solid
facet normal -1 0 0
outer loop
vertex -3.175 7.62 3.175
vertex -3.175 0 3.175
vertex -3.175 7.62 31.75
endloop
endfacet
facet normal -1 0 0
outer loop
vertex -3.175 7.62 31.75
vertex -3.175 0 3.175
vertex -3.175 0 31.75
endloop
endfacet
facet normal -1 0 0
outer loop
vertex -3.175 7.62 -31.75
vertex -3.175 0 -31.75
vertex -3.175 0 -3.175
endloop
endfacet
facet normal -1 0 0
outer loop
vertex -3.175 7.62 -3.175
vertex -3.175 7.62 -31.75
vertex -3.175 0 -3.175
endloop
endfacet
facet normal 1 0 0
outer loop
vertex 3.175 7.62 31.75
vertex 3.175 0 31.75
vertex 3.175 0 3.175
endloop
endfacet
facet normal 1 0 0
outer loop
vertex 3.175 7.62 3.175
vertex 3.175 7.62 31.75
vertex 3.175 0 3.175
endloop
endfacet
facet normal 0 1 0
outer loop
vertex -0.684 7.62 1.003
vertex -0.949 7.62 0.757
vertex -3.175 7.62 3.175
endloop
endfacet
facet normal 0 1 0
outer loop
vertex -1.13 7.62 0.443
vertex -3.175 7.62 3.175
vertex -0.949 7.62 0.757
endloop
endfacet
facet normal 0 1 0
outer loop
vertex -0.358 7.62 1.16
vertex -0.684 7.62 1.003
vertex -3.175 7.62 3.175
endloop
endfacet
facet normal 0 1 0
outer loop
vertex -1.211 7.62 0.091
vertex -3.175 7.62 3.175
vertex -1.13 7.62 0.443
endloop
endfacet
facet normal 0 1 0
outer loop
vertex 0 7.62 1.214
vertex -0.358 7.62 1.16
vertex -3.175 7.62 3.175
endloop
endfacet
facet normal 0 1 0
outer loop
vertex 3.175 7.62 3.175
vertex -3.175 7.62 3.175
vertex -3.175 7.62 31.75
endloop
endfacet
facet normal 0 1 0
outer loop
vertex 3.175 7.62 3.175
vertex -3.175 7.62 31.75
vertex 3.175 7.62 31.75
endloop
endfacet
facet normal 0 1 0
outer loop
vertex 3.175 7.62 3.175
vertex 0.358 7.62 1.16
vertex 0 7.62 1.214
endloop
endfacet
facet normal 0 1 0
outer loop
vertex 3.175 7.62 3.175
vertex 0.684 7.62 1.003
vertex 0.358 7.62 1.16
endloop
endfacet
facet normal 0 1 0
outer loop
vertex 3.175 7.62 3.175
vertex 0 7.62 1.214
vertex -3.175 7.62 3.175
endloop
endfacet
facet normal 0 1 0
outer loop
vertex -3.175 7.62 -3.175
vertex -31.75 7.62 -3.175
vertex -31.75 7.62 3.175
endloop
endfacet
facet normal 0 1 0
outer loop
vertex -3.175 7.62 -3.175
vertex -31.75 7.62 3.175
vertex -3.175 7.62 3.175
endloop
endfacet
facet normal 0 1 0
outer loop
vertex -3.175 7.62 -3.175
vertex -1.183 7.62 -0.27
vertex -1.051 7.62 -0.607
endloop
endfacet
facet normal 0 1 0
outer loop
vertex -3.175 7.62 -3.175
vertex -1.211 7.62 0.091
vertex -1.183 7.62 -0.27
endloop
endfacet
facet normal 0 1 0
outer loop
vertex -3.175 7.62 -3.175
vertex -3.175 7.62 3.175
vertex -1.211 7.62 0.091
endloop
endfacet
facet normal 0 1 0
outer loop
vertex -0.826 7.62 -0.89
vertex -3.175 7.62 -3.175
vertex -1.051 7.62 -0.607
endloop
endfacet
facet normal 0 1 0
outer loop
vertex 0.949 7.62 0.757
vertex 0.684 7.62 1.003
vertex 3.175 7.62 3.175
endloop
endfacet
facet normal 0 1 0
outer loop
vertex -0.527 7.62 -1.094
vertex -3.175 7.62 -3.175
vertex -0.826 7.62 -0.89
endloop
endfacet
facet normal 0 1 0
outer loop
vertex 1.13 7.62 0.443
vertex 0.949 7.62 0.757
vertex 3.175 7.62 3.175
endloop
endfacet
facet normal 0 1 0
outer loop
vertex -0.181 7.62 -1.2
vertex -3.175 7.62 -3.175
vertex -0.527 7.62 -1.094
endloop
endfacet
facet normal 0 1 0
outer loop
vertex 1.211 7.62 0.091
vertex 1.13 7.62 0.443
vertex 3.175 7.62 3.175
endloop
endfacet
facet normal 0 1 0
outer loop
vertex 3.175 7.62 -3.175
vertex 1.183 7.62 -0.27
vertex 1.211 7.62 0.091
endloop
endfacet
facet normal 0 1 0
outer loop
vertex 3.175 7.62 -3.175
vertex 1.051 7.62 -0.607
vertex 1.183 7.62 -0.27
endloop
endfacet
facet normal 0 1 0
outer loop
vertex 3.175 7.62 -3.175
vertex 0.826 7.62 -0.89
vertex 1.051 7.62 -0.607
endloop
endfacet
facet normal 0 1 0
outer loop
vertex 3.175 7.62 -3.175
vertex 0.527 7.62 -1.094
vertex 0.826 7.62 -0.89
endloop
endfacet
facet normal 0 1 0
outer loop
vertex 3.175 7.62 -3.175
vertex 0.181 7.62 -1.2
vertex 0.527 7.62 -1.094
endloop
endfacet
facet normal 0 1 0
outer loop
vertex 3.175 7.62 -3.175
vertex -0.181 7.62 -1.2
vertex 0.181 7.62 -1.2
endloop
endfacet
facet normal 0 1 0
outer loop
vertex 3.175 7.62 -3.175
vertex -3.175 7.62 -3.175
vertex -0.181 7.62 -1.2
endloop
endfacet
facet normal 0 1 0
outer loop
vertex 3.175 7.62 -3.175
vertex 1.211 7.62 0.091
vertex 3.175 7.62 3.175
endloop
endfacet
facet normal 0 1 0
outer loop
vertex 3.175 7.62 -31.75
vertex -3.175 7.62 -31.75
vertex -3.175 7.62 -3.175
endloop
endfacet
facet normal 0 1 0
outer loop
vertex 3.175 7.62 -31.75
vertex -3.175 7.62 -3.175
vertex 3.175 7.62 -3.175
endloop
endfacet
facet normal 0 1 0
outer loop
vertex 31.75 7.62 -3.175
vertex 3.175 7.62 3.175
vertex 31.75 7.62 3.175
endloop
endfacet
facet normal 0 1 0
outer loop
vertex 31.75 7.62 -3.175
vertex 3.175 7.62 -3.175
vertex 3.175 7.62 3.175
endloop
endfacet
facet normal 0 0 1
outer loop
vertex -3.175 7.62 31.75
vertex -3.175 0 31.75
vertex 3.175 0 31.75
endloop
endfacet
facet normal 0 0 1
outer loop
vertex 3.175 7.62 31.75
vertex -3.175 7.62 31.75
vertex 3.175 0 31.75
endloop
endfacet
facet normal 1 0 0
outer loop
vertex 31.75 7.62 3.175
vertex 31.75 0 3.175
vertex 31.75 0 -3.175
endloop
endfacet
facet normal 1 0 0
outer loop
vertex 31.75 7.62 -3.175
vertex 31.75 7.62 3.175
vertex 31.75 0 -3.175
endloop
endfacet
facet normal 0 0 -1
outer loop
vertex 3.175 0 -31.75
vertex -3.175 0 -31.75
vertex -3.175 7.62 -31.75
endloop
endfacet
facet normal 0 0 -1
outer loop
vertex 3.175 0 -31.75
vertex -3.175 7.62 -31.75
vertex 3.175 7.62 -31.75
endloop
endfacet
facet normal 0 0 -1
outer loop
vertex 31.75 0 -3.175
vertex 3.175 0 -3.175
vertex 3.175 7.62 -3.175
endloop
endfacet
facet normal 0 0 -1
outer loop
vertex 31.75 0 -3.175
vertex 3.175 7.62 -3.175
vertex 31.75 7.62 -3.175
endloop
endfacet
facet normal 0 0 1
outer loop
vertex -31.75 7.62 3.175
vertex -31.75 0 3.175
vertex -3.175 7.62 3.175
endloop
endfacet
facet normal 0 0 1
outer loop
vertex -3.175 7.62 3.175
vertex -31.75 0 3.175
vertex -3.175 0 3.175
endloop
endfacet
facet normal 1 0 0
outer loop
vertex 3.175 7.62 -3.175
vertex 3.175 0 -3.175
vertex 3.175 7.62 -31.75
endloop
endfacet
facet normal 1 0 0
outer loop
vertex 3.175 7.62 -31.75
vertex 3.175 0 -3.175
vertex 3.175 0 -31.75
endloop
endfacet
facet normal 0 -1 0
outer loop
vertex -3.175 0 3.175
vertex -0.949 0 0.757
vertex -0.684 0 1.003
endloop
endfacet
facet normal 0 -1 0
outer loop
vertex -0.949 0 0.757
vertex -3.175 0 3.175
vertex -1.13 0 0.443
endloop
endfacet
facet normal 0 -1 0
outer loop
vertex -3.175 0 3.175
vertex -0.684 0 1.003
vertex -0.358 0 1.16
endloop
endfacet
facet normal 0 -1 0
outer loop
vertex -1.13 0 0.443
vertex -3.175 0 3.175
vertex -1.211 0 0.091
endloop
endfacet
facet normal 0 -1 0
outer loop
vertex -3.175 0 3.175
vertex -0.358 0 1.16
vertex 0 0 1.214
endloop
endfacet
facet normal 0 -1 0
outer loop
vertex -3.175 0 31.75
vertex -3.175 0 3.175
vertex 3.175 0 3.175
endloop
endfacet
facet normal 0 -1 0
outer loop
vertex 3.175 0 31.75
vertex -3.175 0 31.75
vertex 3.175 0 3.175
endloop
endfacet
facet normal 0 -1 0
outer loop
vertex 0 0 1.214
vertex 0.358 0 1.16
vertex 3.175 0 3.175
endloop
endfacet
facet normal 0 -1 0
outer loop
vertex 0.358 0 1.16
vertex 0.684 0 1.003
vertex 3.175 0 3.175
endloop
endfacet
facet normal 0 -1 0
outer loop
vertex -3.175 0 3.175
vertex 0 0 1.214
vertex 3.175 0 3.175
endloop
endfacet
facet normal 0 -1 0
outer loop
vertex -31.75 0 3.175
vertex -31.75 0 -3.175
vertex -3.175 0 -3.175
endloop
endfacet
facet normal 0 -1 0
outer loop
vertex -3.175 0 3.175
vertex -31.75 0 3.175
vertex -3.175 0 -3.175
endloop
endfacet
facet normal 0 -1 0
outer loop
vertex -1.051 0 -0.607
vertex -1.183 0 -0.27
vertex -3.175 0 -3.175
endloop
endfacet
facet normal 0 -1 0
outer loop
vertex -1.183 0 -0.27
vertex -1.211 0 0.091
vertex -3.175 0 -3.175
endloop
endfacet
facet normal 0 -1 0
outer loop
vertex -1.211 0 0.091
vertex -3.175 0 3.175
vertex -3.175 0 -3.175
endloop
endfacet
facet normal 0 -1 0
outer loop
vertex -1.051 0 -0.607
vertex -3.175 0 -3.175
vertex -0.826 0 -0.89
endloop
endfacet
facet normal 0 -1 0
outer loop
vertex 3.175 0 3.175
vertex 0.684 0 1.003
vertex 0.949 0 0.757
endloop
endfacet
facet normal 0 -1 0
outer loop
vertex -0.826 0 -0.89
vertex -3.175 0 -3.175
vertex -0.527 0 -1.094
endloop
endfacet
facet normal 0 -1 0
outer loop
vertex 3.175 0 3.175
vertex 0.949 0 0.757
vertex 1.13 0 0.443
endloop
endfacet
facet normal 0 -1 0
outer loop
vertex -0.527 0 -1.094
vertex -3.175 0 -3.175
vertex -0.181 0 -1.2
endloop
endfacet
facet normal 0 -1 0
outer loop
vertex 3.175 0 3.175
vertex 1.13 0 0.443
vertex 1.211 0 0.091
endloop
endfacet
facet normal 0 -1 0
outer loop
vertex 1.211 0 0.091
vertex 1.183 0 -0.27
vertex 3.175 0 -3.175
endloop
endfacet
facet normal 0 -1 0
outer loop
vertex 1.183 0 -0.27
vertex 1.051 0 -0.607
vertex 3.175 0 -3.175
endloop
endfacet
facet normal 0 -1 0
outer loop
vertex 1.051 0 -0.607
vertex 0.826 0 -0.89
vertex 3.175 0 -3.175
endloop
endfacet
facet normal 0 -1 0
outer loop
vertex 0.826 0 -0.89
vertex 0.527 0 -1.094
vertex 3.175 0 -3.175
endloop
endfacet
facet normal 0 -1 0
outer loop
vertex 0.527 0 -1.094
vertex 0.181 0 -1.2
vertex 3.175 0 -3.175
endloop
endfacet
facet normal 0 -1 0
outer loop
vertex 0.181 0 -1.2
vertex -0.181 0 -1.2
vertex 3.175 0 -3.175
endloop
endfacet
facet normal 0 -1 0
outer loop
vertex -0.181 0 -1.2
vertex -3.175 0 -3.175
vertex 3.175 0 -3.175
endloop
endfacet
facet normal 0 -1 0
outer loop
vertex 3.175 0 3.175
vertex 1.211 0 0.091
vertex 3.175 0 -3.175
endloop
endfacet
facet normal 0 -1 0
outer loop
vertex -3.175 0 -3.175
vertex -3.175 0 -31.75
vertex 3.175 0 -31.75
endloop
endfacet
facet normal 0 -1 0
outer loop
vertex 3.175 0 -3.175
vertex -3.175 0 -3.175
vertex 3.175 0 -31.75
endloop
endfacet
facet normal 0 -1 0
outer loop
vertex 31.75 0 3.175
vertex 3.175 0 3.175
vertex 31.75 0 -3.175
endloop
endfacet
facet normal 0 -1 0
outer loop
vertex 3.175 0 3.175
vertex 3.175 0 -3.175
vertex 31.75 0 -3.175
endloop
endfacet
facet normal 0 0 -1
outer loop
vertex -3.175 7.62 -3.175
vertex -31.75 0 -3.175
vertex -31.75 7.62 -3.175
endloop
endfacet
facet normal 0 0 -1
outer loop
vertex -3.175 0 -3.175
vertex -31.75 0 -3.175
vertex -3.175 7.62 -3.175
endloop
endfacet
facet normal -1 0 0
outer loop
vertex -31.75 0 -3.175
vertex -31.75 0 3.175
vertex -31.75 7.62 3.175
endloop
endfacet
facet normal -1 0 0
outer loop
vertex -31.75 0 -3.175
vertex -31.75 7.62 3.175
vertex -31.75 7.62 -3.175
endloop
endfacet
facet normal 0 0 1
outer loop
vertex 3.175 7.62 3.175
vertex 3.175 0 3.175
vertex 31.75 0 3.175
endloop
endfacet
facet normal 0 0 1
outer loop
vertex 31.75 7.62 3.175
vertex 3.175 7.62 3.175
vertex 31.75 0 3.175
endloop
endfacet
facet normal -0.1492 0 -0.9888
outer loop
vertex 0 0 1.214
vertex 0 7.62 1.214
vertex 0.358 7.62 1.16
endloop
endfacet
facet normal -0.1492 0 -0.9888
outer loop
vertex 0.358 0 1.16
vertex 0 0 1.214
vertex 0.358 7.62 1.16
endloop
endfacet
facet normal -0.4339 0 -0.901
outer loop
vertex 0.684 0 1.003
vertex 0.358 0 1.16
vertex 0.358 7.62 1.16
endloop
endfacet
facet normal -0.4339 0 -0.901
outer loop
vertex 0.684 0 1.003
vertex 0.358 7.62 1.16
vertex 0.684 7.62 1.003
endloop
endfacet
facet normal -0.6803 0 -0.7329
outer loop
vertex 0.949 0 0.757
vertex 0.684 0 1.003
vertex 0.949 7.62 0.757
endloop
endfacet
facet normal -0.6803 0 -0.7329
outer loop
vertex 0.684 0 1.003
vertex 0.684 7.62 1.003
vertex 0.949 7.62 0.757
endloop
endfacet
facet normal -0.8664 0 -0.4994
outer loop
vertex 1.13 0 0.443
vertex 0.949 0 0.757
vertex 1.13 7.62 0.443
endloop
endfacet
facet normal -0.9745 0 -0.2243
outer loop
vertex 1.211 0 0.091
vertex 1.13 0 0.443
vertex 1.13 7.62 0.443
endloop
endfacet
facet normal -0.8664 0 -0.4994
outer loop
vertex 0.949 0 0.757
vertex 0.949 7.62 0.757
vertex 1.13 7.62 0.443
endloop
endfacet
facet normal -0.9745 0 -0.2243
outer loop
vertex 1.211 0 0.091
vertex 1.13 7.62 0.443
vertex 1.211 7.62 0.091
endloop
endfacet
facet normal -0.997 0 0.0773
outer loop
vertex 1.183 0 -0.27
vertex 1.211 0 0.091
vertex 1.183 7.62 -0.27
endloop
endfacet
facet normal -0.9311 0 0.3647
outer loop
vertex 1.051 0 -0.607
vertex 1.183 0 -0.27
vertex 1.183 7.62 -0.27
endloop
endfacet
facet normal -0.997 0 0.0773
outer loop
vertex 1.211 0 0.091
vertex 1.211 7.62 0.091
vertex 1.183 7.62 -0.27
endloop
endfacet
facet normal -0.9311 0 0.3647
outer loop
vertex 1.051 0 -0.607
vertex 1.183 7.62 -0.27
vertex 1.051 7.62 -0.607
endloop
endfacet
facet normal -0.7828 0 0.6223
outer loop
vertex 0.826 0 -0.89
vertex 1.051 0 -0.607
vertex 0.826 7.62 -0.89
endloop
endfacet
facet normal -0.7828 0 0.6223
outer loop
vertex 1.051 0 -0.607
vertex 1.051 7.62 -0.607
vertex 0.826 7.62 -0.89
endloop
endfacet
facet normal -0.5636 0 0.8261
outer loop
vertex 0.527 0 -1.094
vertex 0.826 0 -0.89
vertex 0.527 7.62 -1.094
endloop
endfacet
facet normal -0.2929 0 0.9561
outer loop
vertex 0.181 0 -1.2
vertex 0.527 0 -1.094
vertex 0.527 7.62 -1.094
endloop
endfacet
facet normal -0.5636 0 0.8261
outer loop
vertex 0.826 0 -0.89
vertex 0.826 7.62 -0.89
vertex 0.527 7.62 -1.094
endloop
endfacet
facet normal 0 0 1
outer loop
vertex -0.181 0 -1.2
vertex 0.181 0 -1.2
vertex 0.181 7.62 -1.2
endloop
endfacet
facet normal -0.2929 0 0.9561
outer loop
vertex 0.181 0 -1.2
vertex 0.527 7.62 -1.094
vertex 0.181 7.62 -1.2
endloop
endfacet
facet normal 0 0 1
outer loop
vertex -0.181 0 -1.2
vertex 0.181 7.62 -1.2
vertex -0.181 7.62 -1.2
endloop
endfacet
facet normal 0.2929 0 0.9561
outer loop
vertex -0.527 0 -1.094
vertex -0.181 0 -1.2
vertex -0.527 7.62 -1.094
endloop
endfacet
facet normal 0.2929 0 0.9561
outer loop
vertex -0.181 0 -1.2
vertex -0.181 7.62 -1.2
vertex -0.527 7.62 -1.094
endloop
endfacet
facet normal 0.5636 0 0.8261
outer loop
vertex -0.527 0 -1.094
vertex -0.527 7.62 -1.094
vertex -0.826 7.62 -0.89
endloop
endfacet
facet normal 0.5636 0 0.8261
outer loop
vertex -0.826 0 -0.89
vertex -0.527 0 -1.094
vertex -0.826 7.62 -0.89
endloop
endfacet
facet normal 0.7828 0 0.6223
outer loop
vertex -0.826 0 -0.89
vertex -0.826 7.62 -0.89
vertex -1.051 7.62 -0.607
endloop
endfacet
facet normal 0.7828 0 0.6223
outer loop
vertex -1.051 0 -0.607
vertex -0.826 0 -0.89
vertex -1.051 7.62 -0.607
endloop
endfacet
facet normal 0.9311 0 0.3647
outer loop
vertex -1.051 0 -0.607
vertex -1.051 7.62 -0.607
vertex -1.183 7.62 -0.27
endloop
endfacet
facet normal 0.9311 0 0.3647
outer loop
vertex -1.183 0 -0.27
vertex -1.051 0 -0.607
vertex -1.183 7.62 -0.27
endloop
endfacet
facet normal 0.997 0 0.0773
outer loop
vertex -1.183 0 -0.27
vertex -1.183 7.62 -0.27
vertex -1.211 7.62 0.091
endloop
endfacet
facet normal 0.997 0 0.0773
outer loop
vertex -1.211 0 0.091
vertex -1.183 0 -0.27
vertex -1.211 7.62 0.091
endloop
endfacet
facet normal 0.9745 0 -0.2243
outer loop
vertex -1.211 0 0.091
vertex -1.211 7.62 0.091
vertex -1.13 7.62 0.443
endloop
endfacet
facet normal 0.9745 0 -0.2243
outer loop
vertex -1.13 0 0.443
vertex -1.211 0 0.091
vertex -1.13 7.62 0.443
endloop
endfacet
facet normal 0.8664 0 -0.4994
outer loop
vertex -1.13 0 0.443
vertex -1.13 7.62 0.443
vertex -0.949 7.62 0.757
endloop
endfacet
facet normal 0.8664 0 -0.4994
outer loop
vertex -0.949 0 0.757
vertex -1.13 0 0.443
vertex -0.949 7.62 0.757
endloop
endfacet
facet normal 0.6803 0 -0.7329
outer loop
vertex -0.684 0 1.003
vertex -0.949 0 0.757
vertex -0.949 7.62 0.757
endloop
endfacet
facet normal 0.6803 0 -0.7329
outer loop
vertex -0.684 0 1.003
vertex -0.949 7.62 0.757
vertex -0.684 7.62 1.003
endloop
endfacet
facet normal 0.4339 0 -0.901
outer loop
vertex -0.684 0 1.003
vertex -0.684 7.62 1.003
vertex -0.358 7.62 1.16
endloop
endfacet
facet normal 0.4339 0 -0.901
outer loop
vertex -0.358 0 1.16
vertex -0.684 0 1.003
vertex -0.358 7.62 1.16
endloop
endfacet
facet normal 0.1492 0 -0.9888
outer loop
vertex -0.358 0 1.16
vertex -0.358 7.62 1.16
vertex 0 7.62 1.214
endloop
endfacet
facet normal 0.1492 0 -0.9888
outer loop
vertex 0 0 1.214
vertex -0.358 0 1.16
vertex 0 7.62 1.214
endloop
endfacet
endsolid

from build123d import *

# Parameters (mm, degrees)
SKETCH1_W           = 6.35
SKETCH1_H           = 28.575
SKETCH1_H_2         = 6.35
SKETCH1_W_2         = 28.575
BOSS_EXTRUDE1_DEPTH = 7.62
SKETCH2_R           = 1.213900036
CUT_EXTRUDE1_DEPTH  = 46.543269536


with BuildPart() as part:
    # Sketch1 → Boss-Extrude1 (new body)
    with BuildSketch(Plane(origin=(0, 0, 0), x_dir=(1, 0, 0), z_dir=(0, 1, 0))):
        with Locations((0, 17.4625)):
            Rectangle(SKETCH1_W, SKETCH1_H)
        Rectangle(SKETCH1_W, SKETCH1_H_2)
        with Locations((0, -17.4625)):
            Rectangle(SKETCH1_W, SKETCH1_H)
        with Locations((17.4625, 0)):
            Rectangle(SKETCH1_W_2, SKETCH1_H_2)
        with Locations((-17.4625, 0)):
            Rectangle(SKETCH1_W_2, SKETCH1_H_2)
    extrude(amount=BOSS_EXTRUDE1_DEPTH)

    # Sketch2 → Cut-Extrude1 (cut, through all)
    with BuildSketch(Plane(origin=(0, 7.62, 0), x_dir=(1, 0, 0), z_dir=(0, 1, 0))):
        with Locations(Location((0, 0, 0), (0, 0, 270))):
            Circle(SKETCH2_R)
    extrude(amount=-CUT_EXTRUDE1_DEPTH, mode=Mode.SUBTRACT)


solid = part.part
